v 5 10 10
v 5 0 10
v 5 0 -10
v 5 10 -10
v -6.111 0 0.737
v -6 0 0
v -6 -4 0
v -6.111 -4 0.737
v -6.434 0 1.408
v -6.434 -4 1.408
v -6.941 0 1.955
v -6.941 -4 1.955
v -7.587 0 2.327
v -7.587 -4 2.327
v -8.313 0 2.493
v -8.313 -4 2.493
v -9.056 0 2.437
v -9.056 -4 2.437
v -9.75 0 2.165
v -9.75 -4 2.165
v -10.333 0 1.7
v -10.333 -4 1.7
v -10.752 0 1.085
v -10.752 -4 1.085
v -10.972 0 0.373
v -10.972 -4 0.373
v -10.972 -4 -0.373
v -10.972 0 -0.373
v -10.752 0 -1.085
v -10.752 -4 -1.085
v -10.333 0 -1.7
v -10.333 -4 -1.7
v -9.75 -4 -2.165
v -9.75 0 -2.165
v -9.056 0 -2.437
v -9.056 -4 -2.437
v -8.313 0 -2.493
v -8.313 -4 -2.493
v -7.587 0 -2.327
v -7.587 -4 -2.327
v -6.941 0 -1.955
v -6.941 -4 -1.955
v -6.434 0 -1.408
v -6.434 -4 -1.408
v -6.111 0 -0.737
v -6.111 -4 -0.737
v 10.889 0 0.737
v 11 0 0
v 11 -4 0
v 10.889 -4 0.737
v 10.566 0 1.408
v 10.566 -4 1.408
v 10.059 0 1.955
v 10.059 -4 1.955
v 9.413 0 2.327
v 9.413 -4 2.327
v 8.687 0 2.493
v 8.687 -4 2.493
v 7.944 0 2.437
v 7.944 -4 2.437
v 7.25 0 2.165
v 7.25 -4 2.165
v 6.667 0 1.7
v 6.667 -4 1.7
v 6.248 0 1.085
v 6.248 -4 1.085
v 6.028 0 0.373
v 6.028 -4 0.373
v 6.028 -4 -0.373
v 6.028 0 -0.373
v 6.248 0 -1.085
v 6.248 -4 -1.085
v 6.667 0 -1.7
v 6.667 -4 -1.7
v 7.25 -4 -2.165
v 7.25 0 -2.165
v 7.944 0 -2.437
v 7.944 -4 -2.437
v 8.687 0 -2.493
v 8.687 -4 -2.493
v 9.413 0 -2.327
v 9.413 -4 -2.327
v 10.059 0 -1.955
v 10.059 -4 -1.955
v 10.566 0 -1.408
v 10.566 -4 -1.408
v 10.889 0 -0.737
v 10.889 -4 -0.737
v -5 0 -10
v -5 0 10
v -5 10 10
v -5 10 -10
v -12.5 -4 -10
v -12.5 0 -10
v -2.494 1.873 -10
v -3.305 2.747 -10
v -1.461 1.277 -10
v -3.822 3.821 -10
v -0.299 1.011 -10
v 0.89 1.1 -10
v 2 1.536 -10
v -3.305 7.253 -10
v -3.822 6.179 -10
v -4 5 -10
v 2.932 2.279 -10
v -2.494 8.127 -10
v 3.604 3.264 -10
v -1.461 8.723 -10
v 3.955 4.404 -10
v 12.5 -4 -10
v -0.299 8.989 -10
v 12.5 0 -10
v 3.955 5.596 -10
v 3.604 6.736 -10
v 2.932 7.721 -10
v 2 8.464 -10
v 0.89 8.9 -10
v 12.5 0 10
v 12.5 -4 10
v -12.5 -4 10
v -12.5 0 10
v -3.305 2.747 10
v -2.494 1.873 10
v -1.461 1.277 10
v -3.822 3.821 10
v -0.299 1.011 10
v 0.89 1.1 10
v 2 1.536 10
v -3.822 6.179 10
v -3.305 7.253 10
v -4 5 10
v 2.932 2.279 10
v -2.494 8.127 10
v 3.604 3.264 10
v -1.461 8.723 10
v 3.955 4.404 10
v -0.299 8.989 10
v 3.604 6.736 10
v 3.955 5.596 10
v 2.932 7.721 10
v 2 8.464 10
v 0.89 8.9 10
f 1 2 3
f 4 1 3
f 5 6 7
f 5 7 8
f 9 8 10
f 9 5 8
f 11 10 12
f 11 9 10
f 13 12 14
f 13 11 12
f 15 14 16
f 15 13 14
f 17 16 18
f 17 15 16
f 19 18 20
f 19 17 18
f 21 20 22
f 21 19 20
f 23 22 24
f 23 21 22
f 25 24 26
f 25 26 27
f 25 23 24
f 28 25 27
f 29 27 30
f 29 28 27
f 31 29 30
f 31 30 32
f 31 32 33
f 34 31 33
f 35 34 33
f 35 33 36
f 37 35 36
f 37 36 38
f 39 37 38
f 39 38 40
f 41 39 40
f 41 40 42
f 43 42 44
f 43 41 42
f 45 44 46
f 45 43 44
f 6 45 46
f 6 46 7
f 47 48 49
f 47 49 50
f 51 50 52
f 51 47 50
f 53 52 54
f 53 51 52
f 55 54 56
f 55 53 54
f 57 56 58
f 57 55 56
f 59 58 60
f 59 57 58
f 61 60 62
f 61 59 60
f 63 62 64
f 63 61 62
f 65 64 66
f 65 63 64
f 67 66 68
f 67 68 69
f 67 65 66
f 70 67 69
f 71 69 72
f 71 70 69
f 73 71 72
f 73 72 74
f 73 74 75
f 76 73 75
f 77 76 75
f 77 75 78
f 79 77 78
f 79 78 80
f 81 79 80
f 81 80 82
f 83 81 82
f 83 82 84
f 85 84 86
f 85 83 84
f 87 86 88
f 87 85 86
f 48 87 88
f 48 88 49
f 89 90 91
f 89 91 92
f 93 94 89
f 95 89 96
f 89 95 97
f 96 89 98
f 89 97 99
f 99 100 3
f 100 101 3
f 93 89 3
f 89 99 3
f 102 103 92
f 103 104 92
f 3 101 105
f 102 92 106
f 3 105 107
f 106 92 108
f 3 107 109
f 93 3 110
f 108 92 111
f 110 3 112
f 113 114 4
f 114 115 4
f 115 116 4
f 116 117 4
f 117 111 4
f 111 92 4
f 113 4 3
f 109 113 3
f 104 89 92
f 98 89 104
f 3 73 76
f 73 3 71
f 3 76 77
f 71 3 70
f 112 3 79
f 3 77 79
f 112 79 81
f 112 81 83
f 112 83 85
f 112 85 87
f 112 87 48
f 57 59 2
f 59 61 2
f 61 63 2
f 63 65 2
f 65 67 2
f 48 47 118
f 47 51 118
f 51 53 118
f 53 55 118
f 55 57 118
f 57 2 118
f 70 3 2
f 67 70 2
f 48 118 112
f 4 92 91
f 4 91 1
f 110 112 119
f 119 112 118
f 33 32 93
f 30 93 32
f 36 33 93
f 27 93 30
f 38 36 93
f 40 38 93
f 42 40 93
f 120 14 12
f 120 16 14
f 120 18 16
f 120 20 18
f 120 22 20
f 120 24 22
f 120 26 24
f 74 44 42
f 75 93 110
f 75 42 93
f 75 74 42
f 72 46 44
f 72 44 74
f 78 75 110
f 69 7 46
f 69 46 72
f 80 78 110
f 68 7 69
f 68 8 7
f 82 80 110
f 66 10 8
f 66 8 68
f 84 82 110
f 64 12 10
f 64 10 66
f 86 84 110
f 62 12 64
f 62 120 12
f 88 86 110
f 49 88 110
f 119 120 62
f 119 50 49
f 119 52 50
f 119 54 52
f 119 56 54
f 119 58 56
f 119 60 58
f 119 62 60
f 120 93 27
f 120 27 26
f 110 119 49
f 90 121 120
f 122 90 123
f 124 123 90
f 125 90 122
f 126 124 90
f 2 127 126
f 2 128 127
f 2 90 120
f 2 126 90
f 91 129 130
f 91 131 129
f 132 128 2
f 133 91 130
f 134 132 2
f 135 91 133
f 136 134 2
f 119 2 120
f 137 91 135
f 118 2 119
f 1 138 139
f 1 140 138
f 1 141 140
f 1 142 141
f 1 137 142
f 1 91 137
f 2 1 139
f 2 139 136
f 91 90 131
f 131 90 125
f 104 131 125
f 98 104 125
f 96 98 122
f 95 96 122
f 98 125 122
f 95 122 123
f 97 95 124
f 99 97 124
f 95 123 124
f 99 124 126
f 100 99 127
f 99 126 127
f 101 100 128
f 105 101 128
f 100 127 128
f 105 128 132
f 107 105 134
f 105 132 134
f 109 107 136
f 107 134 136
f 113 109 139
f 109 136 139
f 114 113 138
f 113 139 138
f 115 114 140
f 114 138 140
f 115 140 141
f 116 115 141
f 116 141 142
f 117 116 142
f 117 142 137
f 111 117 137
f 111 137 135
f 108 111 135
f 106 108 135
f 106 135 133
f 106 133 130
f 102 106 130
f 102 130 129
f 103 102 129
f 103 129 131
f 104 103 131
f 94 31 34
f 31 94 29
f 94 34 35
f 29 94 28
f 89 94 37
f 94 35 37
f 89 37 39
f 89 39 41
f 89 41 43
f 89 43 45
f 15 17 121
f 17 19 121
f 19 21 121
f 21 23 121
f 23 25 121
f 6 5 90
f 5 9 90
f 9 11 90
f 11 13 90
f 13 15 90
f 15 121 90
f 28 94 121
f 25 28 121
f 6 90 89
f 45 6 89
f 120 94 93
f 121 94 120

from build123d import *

# Parameters (mm, degrees)
SKETCH025_W     = 25
SKETCH025_H     = 20
SKETCH025_R     = 2.5
PAD013_DEPTH    = 4
SKETCH026_W     = 10
SKETCH026_H     = 20
PAD014_DEPTH    = 10
SKETCH027_R     = 4
POCKET013_DEPTH = 20.001


with BuildPart() as part:
    # Sketch025 → Pad013 (new body)
    with BuildSketch(Plane.XZ):
        Rectangle(SKETCH025_W, SKETCH025_H)
        with Locations((-8.5, 0)):
            Circle(SKETCH025_R, mode=Mode.SUBTRACT)
        with Locations((8.5, 0)):
            Circle(SKETCH025_R, mode=Mode.SUBTRACT)
    extrude(amount=PAD013_DEPTH)

    # Sketch026 (on Face7 of Pad013) → Pad014 (join)
    with BuildSketch(Plane(origin=(0, 0, 0), x_dir=(1, 0, 0), z_dir=(0, 1, 0))):
        Rectangle(SKETCH026_W, SKETCH026_H)
    extrude(amount=PAD014_DEPTH)

    # Sketch027 (on Face5 of Pad014) → Pocket013 (cut, through all)
    with BuildSketch(Plane(origin=(0, 0, 10), x_dir=(-1, 0, 0), z_dir=(0, 0, 1))):
        with Locations((0, -5)):
            Circle(SKETCH027_R)
    extrude(amount=-POCKET013_DEPTH, mode=Mode.SUBTRACT)


solid = part.part
